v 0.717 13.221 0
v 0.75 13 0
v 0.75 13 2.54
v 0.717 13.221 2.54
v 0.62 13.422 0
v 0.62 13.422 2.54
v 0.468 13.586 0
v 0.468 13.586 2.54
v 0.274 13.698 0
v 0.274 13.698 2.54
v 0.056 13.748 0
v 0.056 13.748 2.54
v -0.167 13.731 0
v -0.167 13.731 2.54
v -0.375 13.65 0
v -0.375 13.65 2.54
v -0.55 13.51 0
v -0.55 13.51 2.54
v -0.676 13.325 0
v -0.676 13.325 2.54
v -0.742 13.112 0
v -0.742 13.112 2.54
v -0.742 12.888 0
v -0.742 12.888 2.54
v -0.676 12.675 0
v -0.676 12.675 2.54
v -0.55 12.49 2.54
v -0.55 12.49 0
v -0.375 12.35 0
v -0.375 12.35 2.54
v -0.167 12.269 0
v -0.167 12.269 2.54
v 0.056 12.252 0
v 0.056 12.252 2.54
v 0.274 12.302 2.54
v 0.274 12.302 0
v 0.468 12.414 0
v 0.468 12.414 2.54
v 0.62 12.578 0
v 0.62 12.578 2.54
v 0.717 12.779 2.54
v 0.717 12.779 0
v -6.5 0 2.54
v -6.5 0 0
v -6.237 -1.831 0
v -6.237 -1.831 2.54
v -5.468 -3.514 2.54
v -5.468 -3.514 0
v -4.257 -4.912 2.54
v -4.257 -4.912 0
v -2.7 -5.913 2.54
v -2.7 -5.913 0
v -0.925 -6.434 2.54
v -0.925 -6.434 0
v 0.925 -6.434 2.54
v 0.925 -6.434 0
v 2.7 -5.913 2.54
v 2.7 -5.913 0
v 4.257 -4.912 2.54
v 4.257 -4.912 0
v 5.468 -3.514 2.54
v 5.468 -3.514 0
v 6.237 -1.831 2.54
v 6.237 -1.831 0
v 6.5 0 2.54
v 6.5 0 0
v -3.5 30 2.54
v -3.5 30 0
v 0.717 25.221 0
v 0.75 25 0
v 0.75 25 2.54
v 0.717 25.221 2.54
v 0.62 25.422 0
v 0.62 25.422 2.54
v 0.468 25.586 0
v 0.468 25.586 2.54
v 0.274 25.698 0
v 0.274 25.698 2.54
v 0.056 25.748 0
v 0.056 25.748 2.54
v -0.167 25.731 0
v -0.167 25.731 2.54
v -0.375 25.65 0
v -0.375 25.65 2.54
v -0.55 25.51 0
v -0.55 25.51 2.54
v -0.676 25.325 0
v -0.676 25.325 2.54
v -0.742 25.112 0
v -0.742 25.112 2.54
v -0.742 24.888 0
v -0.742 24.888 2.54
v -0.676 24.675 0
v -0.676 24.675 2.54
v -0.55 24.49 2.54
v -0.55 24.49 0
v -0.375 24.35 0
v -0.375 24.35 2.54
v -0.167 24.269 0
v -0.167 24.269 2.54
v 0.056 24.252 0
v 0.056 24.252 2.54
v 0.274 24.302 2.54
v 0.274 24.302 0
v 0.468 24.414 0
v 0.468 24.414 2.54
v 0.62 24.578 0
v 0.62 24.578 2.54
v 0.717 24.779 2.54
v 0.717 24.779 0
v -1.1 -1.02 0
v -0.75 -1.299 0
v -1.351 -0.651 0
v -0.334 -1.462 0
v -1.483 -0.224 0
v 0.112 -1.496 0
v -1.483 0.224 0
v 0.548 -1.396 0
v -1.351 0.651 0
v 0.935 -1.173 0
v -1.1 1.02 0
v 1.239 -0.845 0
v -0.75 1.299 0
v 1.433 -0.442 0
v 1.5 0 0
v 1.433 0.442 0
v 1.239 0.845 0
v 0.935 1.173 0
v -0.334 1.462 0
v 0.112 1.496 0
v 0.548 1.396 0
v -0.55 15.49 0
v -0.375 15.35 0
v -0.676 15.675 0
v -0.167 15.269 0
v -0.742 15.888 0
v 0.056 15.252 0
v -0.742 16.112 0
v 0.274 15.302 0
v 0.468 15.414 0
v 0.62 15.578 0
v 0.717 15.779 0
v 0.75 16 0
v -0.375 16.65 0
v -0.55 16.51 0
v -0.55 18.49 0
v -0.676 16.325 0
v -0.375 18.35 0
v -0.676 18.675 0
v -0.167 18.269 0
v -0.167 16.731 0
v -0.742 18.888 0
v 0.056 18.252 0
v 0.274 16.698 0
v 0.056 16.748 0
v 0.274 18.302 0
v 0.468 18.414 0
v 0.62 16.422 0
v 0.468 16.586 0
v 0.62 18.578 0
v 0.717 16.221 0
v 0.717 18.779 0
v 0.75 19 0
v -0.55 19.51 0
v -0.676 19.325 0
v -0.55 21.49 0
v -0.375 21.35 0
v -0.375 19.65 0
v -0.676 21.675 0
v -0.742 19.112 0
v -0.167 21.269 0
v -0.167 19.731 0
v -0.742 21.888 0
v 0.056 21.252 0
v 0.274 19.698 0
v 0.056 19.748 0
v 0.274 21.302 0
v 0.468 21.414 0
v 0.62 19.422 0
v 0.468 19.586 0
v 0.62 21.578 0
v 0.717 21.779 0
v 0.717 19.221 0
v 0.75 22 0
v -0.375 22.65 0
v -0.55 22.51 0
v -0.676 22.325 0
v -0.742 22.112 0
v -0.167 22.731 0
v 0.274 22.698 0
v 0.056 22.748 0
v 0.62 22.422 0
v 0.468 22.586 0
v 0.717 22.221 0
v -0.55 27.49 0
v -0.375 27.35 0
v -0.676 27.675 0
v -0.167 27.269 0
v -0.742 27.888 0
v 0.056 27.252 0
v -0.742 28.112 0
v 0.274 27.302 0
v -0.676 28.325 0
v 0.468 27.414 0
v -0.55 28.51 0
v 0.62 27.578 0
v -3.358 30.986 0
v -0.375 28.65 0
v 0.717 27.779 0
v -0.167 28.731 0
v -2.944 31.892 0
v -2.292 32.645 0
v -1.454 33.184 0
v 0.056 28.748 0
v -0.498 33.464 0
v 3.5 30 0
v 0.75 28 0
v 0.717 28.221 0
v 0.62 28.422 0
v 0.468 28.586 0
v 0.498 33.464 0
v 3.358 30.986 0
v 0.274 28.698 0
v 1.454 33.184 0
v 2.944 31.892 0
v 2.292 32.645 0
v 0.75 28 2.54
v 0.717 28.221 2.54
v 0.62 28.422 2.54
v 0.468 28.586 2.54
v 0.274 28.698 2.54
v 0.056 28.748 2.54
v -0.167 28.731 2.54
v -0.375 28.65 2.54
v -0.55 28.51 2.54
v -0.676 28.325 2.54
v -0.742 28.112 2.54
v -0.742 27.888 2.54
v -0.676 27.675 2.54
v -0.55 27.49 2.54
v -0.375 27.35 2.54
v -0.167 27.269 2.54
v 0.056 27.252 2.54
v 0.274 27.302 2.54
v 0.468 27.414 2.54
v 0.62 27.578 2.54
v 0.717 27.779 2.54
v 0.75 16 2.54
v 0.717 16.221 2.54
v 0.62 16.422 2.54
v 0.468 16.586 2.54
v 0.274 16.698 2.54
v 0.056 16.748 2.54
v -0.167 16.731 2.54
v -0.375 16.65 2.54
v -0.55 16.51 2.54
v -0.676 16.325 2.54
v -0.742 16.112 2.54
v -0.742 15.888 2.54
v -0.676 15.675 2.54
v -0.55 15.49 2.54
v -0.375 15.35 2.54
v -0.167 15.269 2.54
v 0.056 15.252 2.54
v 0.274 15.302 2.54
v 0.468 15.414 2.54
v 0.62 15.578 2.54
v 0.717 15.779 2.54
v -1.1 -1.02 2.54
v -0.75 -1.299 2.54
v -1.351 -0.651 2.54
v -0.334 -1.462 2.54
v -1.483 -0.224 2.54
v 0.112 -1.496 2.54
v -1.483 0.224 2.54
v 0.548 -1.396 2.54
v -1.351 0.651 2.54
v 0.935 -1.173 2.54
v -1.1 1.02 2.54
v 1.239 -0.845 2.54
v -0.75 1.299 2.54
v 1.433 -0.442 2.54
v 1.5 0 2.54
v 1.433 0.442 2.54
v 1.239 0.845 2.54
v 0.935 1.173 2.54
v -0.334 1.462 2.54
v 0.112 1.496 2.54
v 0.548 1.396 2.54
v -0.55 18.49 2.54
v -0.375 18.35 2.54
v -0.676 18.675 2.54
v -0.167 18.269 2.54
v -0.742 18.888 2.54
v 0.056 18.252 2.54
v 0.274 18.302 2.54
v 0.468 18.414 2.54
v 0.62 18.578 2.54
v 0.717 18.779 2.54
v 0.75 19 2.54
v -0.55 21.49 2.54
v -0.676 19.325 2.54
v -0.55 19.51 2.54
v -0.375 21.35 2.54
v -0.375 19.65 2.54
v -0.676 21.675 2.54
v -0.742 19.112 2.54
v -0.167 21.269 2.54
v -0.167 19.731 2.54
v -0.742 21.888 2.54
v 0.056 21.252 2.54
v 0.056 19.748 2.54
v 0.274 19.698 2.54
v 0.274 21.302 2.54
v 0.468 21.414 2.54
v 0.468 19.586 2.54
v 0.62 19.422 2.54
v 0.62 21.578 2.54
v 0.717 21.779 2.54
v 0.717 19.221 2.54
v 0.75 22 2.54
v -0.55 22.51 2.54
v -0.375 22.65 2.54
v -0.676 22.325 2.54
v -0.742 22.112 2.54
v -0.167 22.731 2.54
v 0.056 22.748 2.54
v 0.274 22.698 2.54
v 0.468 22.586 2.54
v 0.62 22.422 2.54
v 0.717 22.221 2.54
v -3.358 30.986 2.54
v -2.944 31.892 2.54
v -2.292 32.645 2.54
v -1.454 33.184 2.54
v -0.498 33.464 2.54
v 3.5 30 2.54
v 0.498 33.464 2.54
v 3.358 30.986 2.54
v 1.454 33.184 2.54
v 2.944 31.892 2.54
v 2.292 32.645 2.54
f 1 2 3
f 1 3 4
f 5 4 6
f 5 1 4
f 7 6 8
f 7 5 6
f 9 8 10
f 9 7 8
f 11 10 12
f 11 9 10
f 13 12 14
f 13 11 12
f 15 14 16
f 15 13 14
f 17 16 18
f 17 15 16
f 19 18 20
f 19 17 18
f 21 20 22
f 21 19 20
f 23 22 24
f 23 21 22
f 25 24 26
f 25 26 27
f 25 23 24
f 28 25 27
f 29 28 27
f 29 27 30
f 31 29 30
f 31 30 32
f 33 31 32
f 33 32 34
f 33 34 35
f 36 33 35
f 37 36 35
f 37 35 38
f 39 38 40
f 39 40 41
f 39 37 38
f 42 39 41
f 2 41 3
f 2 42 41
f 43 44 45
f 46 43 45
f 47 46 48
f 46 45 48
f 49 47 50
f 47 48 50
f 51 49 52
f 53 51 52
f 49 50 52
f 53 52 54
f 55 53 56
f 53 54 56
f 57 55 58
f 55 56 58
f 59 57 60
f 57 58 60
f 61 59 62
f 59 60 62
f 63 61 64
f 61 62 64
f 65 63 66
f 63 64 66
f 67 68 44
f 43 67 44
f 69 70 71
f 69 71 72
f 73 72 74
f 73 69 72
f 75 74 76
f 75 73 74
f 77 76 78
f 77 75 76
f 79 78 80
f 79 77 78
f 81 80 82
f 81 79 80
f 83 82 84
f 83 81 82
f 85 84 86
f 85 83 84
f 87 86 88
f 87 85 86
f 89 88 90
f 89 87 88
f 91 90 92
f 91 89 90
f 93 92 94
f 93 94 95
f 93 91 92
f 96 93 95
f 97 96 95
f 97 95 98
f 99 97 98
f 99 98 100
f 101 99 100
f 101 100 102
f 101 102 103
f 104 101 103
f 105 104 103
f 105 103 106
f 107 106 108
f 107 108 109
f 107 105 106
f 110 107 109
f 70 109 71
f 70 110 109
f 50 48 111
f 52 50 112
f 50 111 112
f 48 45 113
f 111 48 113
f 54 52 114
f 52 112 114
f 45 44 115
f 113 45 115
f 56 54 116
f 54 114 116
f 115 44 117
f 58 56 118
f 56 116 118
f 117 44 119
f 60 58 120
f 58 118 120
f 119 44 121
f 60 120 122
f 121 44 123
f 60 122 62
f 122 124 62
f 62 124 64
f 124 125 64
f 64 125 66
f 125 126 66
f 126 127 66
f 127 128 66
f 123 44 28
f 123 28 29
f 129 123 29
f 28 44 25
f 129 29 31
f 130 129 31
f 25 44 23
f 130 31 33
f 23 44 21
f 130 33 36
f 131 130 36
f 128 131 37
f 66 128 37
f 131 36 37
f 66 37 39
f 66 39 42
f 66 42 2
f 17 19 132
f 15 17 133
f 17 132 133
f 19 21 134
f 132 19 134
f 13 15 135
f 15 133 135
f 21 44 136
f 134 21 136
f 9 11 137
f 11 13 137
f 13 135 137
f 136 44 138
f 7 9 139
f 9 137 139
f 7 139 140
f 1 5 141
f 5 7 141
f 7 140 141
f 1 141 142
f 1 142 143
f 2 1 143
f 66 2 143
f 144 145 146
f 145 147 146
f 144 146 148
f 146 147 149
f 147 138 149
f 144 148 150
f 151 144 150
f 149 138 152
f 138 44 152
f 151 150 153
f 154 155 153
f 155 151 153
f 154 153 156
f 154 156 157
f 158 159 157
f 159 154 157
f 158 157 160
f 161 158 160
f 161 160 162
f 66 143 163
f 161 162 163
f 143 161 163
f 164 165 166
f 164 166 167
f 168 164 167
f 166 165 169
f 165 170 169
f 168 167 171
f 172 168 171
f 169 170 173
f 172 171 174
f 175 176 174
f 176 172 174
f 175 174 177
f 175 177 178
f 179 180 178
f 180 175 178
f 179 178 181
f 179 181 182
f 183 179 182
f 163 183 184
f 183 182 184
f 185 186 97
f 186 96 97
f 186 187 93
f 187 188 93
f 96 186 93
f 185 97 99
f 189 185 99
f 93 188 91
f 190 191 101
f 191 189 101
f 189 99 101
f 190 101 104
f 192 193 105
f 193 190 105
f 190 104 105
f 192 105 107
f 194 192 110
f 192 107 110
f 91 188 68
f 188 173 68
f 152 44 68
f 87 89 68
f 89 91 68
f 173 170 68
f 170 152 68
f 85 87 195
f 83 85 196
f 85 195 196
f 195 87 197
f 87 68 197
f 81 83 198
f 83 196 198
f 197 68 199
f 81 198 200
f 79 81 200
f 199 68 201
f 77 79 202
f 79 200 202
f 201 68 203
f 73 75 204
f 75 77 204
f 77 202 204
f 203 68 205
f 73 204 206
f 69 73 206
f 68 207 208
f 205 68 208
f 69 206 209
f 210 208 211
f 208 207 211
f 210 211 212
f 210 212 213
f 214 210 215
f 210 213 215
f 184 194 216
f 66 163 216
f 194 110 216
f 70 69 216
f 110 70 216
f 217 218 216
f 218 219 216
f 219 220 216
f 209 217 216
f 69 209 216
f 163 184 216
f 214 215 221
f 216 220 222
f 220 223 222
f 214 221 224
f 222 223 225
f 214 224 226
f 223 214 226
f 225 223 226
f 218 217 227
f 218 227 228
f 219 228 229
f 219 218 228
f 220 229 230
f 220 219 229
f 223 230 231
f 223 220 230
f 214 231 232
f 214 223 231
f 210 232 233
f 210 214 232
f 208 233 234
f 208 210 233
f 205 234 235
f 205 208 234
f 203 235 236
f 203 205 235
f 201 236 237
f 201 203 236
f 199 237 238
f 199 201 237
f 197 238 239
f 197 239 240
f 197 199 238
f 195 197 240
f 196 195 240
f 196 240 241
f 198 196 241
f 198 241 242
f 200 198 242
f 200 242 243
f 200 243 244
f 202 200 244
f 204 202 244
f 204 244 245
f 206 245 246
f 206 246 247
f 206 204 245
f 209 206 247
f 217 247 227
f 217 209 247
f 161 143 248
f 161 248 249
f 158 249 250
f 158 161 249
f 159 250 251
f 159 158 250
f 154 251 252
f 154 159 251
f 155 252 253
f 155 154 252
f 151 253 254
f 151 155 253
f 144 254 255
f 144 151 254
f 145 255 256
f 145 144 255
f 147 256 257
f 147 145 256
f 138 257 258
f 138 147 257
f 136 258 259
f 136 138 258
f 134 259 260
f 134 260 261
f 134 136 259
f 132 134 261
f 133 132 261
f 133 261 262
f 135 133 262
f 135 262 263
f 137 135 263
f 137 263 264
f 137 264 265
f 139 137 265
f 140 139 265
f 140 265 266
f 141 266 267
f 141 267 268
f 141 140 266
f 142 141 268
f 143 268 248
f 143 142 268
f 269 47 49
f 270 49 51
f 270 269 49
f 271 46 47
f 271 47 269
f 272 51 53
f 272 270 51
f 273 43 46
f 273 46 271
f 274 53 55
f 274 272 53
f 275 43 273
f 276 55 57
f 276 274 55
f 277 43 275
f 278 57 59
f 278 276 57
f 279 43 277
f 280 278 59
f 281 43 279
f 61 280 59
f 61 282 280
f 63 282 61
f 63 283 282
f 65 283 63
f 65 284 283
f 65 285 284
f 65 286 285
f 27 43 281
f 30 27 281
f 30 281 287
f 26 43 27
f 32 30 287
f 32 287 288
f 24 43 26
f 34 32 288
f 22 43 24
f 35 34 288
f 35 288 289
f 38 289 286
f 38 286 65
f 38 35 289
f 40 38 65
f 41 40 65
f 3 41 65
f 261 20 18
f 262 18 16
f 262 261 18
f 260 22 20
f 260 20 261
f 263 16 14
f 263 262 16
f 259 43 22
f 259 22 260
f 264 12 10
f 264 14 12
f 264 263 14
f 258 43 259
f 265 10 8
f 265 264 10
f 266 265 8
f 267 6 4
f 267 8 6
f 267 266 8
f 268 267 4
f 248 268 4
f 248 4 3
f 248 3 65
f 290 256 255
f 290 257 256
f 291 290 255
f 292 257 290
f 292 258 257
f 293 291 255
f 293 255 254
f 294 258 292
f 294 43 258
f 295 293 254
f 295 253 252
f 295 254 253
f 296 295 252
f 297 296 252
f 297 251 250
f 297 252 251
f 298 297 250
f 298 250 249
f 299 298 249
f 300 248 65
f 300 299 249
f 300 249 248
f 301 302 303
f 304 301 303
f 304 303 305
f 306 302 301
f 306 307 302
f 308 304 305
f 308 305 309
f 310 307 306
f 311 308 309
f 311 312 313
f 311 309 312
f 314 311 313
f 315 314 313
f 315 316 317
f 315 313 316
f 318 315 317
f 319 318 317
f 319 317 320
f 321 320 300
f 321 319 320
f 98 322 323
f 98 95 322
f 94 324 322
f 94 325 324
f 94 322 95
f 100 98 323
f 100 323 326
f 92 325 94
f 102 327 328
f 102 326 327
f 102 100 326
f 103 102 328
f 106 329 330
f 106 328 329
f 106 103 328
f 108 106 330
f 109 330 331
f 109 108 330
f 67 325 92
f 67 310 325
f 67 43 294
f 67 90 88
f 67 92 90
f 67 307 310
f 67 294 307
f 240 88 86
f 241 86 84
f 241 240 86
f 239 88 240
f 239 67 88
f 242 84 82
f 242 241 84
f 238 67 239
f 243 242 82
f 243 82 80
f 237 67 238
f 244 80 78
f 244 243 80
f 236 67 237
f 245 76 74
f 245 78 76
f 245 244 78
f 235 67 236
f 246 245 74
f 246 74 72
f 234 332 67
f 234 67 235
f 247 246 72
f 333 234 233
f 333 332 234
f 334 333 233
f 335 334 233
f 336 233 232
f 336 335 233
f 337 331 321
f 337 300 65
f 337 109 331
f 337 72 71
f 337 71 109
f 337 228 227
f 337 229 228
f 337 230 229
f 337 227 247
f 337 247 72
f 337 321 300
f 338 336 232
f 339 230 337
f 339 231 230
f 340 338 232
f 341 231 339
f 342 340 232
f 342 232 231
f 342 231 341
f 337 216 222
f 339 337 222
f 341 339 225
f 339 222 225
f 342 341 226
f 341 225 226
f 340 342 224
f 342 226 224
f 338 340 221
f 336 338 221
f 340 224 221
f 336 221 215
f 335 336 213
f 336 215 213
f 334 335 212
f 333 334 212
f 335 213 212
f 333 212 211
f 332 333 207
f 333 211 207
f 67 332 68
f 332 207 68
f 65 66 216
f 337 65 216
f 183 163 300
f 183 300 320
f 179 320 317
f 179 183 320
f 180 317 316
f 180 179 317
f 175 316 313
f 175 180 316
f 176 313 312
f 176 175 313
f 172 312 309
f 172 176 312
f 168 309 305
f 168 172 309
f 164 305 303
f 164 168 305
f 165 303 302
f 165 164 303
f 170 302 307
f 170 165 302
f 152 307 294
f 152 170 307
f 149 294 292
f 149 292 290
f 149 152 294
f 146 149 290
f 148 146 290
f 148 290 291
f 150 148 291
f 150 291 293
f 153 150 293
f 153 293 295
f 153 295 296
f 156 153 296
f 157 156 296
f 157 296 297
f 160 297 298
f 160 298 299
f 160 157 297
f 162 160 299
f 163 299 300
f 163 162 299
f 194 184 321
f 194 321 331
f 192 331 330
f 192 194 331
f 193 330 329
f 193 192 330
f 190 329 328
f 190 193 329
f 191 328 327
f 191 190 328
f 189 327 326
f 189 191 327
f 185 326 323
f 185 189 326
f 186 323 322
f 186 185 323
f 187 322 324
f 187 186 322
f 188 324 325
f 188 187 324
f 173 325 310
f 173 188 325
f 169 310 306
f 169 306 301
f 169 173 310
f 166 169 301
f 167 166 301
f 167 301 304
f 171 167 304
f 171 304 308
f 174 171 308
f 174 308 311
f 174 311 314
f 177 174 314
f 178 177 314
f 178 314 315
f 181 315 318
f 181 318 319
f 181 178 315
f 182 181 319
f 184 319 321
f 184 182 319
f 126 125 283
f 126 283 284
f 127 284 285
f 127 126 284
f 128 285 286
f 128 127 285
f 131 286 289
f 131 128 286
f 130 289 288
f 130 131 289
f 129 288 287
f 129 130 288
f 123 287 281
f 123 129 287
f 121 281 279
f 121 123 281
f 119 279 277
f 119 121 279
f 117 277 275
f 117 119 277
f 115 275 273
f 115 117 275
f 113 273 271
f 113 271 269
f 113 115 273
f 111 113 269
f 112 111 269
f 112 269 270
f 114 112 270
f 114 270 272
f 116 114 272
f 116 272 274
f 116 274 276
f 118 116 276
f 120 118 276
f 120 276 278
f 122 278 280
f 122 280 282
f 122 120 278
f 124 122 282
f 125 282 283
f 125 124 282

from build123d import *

# Parameters (mm, degrees)
ESQUISSE1_R        = 1.5
ESQUISSE1_R_2      = 0.75
BOSS_EXTRU_1_DEPTH = 2.54


with BuildPart() as part:
    # Esquisse1 → Boss.-Extru.1 (new body)
    with BuildSketch(Plane.XY):
        with BuildLine():
            Line((-3.5, 30), (-6.5, 0))
            ThreePointArc((-6.5, 0), (0, -6.5), (6.5, 0))
            Line((6.5, 0), (3.5, 30))
            ThreePointArc((3.5, 30), (0, 33.5), (-3.5, 30))
        make_face()
        Circle(ESQUISSE1_R, mode=Mode.SUBTRACT)
        with Locations((0, 13)):
            Circle(ESQUISSE1_R_2, mode=Mode.SUBTRACT)
        with Locations((0, 16)):
            Circle(ESQUISSE1_R_2, mode=Mode.SUBTRACT)
        with Locations((0, 19)):
            Circle(ESQUISSE1_R_2, mode=Mode.SUBTRACT)
        with Locations((0, 22)):
            Circle(ESQUISSE1_R_2, mode=Mode.SUBTRACT)
        with Locations((0, 25)):
            Circle(ESQUISSE1_R_2, mode=Mode.SUBTRACT)
        with Locations((0, 28)):
            Circle(ESQUISSE1_R_2, mode=Mode.SUBTRACT)
    extrude(amount=BOSS_EXTRU_1_DEPTH)


solid = part.part
